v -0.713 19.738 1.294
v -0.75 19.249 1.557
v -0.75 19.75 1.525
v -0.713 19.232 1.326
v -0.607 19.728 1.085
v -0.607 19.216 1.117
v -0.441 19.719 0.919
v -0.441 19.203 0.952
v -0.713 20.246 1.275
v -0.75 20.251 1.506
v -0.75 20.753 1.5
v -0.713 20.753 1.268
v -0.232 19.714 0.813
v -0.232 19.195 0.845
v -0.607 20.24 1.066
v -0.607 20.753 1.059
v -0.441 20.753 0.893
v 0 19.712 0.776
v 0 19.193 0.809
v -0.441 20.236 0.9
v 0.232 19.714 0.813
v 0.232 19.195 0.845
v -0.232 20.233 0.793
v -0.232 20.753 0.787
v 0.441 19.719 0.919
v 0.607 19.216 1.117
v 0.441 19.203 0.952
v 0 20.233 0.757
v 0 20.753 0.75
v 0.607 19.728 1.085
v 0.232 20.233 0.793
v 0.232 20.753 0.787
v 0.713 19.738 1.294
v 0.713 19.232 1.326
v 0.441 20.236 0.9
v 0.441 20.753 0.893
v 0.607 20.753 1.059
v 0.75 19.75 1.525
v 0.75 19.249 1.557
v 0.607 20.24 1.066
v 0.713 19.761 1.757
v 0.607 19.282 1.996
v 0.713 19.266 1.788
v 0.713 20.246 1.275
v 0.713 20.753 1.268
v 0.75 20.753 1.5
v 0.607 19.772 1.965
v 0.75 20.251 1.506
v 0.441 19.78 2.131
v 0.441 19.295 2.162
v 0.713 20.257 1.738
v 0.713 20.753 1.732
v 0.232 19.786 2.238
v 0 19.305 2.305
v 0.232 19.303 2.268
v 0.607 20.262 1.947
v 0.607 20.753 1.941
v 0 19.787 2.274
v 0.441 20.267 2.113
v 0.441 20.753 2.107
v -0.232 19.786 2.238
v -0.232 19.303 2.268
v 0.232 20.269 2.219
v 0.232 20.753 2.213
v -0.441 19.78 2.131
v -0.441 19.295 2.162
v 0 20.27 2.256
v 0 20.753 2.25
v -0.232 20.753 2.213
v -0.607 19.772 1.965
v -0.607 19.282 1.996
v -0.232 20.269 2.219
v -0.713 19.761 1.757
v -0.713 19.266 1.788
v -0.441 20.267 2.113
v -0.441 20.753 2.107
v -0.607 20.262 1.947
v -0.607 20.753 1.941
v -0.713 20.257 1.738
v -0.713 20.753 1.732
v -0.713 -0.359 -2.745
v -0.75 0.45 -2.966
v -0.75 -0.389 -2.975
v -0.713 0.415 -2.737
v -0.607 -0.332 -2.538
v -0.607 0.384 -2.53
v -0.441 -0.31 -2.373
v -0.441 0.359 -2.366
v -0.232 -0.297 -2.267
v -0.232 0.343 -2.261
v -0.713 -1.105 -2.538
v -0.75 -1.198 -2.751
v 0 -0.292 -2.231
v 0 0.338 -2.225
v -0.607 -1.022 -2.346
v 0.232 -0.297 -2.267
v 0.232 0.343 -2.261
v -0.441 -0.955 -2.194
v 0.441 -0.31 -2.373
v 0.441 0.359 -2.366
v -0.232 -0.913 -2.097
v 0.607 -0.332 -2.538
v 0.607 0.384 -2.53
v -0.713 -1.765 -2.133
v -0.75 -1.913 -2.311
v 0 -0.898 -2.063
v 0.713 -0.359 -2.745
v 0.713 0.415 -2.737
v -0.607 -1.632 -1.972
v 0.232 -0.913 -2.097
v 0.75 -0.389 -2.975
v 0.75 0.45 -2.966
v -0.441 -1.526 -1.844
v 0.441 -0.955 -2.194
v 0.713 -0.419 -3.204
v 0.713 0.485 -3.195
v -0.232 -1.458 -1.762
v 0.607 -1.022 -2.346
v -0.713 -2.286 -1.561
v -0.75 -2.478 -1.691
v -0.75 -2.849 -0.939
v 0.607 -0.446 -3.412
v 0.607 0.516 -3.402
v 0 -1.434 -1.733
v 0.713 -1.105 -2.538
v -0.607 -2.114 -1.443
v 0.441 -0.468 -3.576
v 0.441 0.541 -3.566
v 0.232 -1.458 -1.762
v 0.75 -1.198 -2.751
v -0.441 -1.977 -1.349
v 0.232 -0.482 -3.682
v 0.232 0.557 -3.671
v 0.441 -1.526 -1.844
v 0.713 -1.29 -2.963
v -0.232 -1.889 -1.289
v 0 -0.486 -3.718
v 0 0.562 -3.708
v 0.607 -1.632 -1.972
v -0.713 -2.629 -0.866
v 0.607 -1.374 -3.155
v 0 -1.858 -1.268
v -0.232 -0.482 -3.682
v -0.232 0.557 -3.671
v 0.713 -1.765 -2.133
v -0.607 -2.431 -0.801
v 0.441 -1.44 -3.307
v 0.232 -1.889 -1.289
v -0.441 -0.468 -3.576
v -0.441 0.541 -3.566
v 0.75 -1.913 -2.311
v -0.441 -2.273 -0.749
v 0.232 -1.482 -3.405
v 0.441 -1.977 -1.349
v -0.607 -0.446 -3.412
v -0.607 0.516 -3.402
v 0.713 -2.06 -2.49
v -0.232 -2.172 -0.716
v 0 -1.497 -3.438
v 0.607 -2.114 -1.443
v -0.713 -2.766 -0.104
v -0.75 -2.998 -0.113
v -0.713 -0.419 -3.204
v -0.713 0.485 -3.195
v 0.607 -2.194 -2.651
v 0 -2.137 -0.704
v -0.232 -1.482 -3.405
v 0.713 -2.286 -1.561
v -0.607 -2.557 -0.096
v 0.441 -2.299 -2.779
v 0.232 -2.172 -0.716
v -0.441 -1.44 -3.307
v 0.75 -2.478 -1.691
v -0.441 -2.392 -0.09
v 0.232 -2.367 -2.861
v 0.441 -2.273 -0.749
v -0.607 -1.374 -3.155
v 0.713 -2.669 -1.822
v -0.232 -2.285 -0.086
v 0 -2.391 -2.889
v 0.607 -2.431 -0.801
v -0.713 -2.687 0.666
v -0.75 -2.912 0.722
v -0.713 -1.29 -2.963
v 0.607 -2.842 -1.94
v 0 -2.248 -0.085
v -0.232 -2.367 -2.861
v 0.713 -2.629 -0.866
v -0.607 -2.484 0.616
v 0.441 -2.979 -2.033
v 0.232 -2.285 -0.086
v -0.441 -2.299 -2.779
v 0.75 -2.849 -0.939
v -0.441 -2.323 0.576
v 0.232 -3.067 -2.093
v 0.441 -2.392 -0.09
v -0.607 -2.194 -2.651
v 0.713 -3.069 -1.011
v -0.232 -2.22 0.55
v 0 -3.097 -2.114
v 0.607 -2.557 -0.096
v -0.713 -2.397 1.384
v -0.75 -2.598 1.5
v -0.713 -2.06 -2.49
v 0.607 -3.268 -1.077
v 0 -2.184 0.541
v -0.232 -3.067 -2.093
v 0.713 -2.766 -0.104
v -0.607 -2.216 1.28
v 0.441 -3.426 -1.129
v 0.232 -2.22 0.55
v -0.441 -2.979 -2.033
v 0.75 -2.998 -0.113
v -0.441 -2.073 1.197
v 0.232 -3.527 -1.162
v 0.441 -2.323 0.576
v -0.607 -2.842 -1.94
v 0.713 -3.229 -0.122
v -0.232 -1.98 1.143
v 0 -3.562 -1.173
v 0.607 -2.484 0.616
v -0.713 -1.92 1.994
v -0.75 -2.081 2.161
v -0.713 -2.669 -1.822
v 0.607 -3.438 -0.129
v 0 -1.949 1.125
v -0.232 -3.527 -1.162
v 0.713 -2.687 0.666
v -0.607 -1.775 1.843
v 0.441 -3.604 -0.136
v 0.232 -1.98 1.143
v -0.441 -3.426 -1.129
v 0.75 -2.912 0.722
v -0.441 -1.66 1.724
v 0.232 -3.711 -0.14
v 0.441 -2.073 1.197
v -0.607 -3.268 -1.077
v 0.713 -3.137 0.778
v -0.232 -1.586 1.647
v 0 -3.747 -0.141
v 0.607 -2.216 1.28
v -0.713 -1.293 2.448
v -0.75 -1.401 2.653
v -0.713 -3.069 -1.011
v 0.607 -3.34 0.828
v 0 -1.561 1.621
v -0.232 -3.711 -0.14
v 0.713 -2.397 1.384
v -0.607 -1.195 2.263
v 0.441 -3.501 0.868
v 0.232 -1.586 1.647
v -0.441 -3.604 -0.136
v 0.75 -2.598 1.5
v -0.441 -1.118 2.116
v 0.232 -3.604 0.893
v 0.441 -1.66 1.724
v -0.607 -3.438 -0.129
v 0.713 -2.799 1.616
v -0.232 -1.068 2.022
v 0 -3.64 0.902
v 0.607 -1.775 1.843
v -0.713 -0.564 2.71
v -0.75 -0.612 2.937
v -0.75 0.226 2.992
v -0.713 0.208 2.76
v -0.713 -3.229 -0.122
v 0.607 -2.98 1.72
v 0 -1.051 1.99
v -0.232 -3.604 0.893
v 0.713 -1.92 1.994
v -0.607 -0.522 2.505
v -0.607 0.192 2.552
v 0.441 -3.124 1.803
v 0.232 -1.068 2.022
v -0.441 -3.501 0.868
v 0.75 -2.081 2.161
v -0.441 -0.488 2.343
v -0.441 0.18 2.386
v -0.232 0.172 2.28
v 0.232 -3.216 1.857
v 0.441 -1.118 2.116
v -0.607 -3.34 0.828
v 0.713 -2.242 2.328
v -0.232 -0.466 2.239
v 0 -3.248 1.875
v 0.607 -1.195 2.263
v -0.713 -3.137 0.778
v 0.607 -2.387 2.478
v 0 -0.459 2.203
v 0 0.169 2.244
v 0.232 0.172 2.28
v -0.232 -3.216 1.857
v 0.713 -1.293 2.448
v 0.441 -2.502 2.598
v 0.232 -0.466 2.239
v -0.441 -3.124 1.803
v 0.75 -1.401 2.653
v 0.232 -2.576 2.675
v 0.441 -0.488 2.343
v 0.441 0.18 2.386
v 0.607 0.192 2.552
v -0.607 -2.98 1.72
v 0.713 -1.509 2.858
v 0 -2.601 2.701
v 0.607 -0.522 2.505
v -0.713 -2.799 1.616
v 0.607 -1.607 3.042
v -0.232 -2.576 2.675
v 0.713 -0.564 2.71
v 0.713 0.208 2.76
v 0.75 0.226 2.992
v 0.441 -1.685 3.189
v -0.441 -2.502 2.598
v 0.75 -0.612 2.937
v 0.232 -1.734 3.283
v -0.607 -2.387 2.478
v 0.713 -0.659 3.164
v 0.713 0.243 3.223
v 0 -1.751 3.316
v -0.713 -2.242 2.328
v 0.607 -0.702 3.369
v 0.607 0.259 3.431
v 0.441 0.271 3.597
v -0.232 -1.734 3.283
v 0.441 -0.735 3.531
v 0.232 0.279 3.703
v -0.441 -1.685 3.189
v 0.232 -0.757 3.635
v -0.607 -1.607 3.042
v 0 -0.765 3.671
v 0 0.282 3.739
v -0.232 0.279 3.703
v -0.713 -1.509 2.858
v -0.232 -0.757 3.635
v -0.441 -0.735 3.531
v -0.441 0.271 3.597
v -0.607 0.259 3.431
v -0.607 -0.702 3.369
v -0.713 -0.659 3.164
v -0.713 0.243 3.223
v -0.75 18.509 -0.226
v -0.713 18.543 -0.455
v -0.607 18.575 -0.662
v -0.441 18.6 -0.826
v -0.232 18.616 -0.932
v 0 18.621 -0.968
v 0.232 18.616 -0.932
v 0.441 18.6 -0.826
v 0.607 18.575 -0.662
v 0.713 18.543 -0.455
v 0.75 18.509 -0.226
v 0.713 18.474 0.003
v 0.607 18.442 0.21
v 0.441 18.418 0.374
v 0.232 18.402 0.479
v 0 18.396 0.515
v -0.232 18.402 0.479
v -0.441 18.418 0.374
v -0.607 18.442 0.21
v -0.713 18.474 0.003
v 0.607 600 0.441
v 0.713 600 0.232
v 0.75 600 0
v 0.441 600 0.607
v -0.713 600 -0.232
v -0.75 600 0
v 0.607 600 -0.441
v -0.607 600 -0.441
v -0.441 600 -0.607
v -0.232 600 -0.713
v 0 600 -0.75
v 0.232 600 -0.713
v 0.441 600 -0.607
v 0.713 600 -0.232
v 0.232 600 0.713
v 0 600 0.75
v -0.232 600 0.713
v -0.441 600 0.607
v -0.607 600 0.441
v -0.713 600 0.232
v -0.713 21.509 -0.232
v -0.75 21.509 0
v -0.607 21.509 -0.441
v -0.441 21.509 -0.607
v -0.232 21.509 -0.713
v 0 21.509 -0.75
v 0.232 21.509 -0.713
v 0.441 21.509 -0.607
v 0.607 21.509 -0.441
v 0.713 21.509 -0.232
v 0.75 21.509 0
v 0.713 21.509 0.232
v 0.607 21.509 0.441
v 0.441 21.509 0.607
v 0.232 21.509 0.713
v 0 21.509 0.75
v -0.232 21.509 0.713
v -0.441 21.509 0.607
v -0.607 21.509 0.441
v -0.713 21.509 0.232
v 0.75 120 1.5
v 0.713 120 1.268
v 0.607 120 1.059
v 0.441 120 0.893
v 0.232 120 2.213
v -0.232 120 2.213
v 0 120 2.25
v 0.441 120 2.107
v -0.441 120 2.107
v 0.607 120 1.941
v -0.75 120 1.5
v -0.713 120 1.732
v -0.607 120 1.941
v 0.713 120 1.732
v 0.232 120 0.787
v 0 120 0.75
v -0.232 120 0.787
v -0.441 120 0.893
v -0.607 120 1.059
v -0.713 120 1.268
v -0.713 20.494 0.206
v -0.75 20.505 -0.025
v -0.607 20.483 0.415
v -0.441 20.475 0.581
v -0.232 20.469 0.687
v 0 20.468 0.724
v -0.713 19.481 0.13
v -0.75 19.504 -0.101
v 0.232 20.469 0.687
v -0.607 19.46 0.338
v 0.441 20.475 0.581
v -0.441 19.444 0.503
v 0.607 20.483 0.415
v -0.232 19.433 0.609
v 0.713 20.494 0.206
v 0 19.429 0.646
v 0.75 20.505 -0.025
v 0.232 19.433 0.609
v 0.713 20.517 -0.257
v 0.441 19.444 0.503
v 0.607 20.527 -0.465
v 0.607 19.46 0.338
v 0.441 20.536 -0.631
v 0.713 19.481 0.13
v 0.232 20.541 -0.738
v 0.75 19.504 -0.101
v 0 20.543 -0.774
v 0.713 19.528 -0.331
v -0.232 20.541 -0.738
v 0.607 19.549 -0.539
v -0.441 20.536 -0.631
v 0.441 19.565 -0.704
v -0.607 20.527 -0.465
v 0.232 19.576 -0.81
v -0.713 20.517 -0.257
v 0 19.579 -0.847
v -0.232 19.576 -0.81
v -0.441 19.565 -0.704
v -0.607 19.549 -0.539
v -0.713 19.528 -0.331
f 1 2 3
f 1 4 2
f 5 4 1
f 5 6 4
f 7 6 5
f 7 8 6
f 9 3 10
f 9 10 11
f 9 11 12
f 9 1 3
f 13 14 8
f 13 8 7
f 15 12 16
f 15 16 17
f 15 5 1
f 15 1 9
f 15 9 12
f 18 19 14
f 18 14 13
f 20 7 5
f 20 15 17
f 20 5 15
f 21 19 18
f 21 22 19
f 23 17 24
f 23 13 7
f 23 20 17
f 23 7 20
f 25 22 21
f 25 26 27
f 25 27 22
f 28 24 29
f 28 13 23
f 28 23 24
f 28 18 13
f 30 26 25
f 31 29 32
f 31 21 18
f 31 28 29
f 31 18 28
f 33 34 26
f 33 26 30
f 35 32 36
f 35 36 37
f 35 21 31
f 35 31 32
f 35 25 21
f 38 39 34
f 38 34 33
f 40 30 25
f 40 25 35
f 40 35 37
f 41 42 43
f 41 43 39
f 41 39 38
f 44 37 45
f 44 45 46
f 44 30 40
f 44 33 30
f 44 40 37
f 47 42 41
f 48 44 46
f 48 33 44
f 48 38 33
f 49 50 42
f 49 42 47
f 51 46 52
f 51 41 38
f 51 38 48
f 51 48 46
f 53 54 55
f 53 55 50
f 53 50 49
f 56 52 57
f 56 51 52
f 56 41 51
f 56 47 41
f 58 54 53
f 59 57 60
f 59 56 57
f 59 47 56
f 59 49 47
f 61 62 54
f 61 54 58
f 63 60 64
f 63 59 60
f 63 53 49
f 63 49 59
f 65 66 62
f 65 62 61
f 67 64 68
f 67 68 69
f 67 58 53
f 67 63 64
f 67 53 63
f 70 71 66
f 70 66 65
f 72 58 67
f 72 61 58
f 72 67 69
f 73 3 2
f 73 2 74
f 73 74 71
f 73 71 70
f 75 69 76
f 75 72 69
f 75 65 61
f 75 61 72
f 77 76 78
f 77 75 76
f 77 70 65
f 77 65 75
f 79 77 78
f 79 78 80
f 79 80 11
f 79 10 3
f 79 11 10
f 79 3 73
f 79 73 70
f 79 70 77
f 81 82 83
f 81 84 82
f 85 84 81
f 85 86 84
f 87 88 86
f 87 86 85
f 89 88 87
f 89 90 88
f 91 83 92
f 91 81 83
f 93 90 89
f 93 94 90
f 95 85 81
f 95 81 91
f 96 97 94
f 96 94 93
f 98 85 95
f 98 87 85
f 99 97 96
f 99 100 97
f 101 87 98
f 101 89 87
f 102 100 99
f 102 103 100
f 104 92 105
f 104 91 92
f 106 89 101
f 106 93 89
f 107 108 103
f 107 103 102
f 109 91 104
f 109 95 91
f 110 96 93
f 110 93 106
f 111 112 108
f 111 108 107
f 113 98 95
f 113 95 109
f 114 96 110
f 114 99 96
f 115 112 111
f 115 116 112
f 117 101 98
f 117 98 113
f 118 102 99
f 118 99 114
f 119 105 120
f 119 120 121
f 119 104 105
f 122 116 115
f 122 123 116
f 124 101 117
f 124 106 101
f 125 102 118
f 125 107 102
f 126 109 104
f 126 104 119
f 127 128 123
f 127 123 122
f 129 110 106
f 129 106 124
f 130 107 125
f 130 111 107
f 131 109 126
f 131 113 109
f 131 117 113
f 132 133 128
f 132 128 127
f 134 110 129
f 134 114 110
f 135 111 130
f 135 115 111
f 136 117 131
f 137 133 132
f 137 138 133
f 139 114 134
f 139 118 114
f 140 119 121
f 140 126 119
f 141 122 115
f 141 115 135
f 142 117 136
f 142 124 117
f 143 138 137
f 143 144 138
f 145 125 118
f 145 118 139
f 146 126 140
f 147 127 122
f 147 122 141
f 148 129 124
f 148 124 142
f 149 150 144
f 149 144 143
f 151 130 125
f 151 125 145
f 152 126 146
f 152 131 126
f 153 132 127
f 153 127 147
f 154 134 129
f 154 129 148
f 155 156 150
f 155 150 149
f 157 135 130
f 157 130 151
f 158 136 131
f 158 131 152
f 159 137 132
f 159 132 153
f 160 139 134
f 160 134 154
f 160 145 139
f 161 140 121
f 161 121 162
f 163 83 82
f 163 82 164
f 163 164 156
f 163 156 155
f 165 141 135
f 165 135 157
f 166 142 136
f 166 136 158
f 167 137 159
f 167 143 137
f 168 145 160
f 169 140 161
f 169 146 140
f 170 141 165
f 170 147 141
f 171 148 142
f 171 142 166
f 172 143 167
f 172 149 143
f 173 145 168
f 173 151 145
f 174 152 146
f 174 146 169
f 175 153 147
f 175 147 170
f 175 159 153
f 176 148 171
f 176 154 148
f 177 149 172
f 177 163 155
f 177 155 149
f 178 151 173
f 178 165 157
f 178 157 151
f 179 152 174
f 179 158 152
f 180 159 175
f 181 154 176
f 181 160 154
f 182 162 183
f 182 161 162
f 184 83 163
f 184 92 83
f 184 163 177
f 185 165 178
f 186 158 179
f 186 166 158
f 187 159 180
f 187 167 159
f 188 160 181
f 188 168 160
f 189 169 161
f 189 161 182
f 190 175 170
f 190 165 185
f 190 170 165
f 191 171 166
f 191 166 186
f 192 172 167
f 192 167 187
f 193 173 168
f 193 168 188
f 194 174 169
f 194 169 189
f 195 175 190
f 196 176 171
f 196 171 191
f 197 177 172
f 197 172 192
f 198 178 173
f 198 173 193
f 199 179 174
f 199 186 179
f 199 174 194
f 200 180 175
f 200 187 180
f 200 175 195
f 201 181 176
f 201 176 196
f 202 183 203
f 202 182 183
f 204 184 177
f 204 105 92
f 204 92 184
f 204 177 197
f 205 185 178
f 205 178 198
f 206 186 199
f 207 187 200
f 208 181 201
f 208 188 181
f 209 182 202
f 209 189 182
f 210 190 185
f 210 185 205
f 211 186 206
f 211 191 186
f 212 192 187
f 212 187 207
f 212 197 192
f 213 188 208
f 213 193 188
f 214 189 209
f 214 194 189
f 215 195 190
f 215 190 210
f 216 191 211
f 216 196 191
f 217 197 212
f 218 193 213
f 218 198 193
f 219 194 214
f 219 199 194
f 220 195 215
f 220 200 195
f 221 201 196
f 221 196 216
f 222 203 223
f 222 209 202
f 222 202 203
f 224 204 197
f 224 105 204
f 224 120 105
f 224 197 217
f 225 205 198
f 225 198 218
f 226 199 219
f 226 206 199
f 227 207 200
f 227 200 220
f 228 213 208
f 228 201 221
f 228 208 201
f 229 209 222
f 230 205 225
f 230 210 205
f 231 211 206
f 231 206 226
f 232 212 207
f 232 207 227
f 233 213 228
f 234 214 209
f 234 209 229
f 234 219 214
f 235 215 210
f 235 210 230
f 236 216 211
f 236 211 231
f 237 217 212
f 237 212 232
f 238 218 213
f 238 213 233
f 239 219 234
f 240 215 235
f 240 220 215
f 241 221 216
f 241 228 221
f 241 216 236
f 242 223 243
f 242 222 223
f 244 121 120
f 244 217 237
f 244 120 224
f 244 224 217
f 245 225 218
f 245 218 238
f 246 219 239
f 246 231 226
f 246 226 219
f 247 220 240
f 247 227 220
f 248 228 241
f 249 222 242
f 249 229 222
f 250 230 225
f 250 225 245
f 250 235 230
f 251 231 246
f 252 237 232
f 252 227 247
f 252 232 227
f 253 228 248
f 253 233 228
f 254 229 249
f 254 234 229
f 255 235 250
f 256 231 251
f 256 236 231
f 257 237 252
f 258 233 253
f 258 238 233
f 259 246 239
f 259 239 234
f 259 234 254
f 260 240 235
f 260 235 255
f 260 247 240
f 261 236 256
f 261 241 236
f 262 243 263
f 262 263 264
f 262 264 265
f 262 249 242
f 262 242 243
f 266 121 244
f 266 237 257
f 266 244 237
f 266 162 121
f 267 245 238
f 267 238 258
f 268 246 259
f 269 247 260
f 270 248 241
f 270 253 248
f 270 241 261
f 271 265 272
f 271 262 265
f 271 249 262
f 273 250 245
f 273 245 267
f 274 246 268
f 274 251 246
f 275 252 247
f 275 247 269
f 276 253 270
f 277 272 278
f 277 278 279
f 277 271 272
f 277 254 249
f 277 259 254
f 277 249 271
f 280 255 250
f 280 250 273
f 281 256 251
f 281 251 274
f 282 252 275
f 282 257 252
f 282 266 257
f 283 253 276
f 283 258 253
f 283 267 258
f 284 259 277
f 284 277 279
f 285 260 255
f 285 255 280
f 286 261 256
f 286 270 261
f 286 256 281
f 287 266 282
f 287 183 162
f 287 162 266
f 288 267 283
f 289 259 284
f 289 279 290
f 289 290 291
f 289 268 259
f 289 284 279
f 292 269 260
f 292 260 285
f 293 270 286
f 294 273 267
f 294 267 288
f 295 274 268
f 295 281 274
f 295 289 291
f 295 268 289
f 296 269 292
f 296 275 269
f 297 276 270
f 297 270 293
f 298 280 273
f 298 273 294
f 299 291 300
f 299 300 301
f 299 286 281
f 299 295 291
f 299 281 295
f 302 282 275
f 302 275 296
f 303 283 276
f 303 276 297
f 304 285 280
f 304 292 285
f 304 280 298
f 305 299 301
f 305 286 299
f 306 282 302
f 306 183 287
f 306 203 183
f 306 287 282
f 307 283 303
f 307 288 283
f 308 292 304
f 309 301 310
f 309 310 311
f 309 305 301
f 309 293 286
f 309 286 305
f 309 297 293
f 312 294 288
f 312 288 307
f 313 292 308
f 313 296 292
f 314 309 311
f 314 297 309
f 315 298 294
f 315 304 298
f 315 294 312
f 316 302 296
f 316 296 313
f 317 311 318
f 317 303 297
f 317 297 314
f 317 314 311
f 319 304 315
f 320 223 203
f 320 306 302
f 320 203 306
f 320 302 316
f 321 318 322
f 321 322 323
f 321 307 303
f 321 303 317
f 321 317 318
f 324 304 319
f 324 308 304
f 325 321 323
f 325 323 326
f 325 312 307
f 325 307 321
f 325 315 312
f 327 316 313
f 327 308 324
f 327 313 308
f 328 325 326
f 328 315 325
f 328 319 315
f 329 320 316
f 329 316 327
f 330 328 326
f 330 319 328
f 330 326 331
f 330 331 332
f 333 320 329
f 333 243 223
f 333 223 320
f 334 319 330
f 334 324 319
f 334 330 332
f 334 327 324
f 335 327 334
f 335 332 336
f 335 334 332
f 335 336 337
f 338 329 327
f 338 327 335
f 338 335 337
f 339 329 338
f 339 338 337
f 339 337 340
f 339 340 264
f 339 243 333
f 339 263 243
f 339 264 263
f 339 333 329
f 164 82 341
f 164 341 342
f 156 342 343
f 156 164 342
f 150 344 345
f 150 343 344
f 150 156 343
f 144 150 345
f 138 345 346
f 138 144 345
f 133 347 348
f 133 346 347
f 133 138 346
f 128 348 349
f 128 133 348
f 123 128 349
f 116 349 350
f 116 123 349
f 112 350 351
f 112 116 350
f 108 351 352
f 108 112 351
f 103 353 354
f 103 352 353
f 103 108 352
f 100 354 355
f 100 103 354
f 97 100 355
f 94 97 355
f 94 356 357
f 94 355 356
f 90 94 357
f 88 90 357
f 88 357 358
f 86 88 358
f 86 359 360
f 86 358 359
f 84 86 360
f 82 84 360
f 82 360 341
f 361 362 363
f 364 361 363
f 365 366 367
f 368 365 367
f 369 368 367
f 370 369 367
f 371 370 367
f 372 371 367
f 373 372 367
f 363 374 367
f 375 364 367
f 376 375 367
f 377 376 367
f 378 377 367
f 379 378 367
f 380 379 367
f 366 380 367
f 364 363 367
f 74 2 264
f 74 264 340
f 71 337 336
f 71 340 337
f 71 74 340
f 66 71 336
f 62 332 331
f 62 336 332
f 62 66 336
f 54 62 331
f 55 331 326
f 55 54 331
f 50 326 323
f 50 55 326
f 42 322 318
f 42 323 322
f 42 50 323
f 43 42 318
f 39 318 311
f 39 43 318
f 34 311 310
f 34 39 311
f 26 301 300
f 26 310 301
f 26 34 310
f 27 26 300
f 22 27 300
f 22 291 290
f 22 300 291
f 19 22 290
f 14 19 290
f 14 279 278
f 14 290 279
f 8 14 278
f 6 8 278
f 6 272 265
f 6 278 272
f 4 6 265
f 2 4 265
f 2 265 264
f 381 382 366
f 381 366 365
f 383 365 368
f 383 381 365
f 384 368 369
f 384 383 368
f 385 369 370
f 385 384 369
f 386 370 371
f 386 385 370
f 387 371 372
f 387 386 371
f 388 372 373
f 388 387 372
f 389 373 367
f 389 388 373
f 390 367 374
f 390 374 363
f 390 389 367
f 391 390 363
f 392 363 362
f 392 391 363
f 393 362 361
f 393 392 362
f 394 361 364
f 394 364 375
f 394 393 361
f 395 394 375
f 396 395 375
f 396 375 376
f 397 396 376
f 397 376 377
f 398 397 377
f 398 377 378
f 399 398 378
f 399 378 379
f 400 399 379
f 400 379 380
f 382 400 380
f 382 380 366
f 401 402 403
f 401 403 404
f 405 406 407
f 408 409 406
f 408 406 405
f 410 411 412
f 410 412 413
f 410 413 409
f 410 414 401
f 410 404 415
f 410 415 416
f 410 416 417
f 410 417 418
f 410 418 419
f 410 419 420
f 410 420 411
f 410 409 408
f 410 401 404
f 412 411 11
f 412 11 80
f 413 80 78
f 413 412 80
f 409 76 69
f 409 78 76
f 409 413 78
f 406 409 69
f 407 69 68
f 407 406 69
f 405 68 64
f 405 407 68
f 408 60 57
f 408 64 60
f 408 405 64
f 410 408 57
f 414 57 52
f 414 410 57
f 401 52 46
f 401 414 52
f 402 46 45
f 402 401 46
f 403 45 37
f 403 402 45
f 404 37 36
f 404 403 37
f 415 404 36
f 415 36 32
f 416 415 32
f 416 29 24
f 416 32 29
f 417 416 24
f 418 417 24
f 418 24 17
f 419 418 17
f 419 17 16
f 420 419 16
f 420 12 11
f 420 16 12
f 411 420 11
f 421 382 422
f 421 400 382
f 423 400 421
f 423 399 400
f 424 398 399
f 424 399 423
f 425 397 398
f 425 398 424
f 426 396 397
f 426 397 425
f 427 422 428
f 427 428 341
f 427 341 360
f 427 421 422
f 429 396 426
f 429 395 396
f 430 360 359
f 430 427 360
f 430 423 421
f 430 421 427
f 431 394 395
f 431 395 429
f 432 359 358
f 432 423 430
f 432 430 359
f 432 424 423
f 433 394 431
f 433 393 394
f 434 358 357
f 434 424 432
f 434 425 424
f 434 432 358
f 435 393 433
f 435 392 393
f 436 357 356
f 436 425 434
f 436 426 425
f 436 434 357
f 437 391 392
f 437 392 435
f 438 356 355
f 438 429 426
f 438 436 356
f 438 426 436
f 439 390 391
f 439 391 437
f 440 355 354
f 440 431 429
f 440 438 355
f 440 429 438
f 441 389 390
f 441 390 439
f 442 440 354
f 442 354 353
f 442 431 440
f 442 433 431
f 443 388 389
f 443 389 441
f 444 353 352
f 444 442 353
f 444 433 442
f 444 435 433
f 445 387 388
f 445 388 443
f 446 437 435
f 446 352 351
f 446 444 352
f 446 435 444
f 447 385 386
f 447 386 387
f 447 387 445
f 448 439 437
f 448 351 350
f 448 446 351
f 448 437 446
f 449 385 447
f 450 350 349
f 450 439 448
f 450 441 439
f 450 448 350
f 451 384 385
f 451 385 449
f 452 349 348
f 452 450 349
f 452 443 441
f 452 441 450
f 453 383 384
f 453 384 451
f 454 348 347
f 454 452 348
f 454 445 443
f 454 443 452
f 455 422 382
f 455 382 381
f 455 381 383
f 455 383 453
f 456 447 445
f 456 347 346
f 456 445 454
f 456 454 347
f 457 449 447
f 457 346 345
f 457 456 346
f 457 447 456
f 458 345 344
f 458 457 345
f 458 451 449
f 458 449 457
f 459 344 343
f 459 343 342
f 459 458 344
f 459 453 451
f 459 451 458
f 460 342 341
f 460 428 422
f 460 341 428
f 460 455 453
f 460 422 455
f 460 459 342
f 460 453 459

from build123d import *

# Parameters (mm, degrees)
SKETCH2_R = 0.75


with BuildPart() as part:
    # Sweep1: sweep along a path in Sketch1
    with BuildLine(Plane(origin=(0, 0, 0), x_dir=(0, 0, -1), z_dir=(1, 0, 0))) as sweep1_path:
        Line((0, 600), (0, 21.508533778))
        ThreePointArc((0, 21.508533778), (0.056650248, 20.004272941), (0.226280067, 18.508533778))
        Line((0.226280067, 18.508533778), (2.96605799, 0.45))
        ThreePointArc((2.96605799, 0.45), (0.112900451, -2.997874829), (-2.9915026, 0.225637305))
        Line((-2.9915026, 0.225637305), (-1.556649332, 19.248942344))
        ThreePointArc((-1.556649332, 19.248942344), (-1.514167351, 20.000533536), (-1.5, 20.753191044))
        Line((-1.5, 20.753191044), (-1.5, 120))
    # Sketch2 → Sweep1 (sweep)
    with BuildSketch(Plane(origin=(0, 120, 1.5), x_dir=(-1, 0, 0), z_dir=(0, 1, 0))):
        Circle(SKETCH2_R)
    sweep(path=sweep1_path.line)


solid = part.part
